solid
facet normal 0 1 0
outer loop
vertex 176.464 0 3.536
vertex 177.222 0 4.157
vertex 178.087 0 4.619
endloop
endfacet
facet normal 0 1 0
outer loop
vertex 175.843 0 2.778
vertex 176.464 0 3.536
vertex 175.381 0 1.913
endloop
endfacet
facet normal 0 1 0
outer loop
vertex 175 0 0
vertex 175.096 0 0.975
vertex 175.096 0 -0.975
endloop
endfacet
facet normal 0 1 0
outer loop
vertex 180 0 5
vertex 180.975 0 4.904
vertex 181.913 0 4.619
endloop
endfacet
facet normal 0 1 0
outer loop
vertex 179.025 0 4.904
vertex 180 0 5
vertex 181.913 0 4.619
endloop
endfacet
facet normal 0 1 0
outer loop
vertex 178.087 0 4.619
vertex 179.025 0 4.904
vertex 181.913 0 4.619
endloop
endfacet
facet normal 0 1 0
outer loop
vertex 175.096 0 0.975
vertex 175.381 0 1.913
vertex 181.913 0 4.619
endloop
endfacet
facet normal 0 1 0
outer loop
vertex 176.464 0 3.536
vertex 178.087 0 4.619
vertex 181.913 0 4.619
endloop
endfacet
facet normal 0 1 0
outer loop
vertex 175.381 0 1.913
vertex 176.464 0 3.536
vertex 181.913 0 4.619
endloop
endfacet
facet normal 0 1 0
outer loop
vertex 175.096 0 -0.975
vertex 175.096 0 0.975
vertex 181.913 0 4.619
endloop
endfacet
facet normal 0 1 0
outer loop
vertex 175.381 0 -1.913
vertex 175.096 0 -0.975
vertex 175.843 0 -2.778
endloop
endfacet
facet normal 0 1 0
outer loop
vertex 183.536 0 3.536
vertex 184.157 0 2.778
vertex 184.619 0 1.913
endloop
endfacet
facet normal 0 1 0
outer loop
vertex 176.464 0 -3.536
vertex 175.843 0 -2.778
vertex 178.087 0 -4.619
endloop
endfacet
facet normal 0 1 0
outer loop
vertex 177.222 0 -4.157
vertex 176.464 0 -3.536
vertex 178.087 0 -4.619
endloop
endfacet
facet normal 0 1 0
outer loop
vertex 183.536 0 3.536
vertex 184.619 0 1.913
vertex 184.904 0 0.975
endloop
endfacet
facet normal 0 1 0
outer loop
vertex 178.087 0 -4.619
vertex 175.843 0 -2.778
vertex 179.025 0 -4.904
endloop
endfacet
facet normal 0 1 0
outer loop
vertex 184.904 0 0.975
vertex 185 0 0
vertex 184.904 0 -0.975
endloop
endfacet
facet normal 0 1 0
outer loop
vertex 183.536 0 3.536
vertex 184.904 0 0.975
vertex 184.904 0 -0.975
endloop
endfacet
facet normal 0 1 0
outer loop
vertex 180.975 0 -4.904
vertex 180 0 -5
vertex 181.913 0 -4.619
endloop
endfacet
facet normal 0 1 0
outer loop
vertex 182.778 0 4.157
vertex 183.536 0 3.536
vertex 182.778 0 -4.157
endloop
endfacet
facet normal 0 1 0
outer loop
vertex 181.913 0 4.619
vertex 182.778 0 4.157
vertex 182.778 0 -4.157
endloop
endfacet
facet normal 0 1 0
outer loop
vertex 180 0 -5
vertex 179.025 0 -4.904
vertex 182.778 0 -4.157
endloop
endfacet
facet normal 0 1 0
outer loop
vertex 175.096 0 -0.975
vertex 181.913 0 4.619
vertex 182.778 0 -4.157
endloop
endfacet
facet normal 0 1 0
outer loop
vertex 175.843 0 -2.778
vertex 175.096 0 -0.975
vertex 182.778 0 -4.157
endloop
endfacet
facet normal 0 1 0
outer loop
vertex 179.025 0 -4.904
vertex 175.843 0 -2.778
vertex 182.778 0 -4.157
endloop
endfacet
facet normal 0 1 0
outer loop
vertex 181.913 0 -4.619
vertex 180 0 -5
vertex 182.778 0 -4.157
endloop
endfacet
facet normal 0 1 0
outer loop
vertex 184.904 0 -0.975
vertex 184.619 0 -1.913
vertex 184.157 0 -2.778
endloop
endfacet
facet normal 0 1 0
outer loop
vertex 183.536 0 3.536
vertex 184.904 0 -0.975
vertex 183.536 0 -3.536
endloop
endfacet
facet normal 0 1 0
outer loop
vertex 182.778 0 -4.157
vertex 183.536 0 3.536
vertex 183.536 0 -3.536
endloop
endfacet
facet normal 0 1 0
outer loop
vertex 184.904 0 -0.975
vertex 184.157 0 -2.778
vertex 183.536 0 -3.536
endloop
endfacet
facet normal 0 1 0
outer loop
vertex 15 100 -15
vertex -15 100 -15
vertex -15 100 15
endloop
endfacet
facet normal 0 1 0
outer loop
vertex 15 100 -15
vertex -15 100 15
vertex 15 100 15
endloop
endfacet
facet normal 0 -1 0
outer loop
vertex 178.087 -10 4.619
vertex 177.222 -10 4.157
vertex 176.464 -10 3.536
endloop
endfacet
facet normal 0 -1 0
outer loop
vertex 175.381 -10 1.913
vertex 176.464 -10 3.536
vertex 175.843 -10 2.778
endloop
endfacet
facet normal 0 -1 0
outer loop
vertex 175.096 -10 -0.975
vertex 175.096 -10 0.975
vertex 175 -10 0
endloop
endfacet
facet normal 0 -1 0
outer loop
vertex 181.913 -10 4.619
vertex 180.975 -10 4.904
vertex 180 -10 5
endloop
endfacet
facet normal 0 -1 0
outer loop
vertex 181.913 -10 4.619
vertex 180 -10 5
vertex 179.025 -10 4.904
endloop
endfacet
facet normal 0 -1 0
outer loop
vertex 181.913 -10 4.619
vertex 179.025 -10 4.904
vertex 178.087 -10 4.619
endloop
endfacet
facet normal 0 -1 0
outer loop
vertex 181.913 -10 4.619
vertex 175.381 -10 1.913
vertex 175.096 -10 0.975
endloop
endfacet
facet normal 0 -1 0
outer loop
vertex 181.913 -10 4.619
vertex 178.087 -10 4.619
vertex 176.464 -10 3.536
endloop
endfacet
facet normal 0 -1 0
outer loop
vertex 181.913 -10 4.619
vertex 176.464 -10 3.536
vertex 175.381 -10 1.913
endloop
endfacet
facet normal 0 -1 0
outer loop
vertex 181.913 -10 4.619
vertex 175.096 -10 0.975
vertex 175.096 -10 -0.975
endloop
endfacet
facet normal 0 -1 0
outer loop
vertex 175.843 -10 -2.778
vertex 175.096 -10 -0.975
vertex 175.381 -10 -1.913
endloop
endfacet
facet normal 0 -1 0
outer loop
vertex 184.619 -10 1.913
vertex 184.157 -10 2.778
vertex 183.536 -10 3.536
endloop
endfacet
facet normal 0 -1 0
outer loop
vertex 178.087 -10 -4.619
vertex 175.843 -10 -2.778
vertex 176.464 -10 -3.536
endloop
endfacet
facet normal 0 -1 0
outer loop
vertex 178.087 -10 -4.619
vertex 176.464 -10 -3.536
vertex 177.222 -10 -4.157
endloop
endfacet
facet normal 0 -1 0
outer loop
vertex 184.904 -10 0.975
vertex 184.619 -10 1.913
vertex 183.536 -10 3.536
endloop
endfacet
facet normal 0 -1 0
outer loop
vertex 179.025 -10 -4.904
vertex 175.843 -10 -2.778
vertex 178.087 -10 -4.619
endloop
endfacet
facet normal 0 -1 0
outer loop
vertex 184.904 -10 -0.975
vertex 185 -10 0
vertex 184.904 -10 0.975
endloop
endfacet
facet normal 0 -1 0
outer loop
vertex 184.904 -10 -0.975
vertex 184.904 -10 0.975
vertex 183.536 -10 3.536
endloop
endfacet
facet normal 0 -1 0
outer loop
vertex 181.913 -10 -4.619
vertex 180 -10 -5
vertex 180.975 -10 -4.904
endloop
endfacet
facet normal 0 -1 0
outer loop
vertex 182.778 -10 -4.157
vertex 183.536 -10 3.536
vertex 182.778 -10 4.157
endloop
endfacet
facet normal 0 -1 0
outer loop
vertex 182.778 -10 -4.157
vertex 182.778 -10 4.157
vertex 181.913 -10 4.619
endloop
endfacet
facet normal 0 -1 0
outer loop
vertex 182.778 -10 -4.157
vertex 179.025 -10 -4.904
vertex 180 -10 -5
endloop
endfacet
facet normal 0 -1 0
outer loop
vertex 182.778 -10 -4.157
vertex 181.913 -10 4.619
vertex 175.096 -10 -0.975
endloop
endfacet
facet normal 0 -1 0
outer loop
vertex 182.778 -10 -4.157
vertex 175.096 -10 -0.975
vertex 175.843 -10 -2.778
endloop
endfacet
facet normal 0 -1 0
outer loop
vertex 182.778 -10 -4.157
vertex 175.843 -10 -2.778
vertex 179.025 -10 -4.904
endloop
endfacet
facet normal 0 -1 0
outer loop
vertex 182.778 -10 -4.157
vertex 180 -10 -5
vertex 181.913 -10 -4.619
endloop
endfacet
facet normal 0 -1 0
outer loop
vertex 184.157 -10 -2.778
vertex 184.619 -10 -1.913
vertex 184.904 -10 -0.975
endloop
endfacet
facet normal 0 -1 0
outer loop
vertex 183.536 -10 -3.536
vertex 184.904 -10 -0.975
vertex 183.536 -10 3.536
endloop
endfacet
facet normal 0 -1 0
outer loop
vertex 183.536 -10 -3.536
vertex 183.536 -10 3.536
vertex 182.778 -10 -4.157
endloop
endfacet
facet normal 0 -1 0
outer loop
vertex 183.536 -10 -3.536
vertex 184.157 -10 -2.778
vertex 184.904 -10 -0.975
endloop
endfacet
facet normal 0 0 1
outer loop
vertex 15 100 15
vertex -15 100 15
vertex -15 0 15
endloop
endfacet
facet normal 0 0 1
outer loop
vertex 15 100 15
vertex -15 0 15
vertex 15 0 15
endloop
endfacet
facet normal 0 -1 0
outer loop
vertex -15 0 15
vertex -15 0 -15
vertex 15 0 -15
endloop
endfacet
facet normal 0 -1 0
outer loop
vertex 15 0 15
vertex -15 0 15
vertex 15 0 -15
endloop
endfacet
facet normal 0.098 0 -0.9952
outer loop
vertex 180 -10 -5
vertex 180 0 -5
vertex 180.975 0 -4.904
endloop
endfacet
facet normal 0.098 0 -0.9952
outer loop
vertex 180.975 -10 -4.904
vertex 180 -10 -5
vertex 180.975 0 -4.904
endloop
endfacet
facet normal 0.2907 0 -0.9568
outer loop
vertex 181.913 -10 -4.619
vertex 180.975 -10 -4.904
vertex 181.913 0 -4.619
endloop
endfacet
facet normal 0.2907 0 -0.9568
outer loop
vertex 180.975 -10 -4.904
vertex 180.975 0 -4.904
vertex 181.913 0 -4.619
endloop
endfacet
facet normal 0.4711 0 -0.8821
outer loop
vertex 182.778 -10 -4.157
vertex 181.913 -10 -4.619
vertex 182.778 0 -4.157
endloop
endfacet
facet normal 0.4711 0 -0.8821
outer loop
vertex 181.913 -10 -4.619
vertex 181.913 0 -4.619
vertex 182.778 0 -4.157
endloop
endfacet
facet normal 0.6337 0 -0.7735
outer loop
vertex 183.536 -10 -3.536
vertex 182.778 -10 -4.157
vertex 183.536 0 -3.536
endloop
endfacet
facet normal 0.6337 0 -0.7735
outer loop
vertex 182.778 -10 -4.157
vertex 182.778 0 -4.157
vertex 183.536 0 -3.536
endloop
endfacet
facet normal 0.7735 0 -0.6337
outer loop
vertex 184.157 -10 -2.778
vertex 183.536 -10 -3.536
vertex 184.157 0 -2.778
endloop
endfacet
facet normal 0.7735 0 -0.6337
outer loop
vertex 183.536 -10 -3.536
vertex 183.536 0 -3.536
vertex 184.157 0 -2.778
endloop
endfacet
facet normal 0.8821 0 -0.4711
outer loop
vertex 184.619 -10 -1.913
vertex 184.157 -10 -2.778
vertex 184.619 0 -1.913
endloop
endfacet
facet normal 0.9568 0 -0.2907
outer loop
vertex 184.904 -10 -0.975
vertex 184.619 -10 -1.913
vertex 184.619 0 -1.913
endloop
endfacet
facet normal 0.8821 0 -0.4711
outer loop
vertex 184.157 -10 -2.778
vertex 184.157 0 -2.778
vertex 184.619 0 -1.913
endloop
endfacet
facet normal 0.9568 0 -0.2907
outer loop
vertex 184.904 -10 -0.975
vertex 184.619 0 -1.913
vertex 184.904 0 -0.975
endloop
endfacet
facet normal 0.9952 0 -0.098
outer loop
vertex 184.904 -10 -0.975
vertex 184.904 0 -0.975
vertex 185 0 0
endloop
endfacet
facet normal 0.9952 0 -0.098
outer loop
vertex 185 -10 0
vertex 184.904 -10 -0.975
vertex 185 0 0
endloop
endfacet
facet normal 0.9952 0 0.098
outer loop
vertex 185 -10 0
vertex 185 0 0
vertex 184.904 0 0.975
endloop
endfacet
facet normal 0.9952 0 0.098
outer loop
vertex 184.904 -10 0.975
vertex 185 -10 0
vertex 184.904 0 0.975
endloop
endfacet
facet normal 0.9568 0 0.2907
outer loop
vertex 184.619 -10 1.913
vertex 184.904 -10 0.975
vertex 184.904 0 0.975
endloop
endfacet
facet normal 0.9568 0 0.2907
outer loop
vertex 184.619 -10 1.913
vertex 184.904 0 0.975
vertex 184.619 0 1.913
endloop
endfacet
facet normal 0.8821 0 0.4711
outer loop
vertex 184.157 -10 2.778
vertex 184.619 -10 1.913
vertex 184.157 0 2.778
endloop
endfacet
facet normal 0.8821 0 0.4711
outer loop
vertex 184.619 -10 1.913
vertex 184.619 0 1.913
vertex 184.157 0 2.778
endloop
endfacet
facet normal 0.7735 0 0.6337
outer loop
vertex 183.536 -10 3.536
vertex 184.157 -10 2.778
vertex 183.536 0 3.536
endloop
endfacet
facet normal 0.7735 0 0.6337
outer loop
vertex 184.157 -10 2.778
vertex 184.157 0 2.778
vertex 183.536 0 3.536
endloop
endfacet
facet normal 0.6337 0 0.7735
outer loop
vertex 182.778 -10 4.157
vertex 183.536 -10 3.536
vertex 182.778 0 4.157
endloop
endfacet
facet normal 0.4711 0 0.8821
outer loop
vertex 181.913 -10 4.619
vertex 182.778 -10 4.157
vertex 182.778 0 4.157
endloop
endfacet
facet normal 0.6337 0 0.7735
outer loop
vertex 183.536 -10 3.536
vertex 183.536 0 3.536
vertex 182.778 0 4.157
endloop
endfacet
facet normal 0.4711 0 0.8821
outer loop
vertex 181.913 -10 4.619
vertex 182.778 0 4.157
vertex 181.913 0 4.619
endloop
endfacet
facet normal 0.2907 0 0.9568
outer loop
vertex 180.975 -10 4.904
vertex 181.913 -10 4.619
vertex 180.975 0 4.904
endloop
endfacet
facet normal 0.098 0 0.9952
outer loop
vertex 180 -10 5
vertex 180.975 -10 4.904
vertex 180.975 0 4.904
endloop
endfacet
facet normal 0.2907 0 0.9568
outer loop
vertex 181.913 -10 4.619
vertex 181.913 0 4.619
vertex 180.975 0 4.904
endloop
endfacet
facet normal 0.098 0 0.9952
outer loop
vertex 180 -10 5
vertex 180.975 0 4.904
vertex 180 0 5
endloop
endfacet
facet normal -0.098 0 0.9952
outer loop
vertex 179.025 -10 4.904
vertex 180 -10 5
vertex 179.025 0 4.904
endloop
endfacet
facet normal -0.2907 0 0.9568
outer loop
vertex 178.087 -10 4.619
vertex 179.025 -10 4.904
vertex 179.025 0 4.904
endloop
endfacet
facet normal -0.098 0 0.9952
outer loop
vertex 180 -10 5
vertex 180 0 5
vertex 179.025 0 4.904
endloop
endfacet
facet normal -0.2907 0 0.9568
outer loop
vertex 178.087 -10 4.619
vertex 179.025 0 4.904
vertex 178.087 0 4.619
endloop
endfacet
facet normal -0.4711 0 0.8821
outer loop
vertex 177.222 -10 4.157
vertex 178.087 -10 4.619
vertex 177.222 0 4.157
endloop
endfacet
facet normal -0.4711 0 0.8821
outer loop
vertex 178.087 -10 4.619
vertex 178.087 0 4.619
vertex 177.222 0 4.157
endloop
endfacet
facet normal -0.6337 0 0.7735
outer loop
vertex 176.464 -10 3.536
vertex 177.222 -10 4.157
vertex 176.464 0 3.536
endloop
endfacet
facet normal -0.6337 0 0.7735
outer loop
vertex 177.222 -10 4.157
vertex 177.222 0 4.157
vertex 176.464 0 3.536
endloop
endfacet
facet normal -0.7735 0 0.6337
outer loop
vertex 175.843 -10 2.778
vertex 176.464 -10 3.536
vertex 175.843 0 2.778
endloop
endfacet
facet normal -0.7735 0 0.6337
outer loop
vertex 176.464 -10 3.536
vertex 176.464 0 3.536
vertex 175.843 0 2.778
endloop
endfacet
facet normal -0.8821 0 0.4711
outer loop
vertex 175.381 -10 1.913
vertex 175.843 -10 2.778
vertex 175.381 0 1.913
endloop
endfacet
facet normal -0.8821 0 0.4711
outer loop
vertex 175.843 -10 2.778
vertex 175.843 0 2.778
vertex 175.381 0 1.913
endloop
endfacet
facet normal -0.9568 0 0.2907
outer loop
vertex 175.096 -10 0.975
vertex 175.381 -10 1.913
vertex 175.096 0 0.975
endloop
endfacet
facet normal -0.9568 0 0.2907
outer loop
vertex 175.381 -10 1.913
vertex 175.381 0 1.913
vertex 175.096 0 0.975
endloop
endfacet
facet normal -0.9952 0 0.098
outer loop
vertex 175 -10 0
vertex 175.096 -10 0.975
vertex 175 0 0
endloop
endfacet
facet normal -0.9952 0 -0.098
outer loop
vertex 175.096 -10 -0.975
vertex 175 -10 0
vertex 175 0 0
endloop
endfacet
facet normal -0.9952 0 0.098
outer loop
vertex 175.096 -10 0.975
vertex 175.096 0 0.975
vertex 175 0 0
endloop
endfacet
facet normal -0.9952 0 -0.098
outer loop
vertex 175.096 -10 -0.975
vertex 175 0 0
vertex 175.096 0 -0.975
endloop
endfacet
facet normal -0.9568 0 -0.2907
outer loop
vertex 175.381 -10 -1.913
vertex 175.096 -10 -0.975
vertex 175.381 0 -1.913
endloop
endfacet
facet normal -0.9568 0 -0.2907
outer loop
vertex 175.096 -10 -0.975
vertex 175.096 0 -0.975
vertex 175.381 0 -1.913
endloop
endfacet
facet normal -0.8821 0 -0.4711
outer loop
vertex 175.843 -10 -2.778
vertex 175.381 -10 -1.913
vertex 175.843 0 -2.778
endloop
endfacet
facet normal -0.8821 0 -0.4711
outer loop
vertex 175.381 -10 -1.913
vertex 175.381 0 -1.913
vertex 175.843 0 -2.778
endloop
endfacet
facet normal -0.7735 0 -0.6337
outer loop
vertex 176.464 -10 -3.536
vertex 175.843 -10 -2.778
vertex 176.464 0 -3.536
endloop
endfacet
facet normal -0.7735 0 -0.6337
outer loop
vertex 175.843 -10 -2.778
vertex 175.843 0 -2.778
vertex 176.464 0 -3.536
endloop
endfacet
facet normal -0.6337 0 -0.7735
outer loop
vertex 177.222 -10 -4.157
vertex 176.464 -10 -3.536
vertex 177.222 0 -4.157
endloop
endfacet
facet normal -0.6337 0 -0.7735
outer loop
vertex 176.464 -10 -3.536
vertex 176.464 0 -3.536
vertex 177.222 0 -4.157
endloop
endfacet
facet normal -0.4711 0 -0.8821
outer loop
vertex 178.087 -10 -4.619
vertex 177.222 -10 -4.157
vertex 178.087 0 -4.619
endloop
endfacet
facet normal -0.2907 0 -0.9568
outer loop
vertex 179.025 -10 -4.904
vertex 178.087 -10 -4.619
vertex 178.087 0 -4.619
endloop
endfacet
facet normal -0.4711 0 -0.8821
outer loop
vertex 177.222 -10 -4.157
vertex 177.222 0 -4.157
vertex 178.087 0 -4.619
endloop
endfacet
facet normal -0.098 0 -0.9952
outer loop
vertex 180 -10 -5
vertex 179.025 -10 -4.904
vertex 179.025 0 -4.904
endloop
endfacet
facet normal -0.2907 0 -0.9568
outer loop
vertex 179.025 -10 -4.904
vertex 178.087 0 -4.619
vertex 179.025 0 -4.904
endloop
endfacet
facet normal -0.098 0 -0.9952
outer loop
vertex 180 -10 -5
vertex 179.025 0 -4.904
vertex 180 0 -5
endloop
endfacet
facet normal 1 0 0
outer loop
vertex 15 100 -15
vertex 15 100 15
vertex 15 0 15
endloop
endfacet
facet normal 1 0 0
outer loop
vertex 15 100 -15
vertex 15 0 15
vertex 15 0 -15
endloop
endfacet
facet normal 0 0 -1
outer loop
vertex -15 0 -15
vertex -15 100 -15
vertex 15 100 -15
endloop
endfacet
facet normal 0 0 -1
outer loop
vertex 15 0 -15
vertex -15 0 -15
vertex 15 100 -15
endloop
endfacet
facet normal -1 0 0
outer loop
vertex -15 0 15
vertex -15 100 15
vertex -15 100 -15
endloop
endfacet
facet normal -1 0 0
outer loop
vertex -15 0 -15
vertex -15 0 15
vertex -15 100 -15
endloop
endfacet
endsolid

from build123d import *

# Parameters (mm, degrees)
SKETCH1_W           = 30
SKETCH1_H           = 30
BOSS_EXTRUDE1_DEPTH = 100
SKETCH2_R           = 5
BOSS_EXTRUDE2_DEPTH = 10


with BuildPart() as part:
    # Sketch1 → Boss-Extrude1 (new body)
    with BuildSketch(Plane(origin=(0, 0, 0), x_dir=(1, 0, 0), z_dir=(0, 1, 0))):
        Rectangle(SKETCH1_W, SKETCH1_H)
    extrude(amount=BOSS_EXTRUDE1_DEPTH)


with BuildPart() as body_2:
    # Sketch2 → Boss-Extrude2 (new body)
    with BuildSketch(Plane.XZ):
        with Locations(Location((180, 0, 0), (0, 0, 270))):
            Circle(SKETCH2_R)
    extrude(amount=BOSS_EXTRUDE2_DEPTH)


solid = Compound([part.part, body_2.part])
